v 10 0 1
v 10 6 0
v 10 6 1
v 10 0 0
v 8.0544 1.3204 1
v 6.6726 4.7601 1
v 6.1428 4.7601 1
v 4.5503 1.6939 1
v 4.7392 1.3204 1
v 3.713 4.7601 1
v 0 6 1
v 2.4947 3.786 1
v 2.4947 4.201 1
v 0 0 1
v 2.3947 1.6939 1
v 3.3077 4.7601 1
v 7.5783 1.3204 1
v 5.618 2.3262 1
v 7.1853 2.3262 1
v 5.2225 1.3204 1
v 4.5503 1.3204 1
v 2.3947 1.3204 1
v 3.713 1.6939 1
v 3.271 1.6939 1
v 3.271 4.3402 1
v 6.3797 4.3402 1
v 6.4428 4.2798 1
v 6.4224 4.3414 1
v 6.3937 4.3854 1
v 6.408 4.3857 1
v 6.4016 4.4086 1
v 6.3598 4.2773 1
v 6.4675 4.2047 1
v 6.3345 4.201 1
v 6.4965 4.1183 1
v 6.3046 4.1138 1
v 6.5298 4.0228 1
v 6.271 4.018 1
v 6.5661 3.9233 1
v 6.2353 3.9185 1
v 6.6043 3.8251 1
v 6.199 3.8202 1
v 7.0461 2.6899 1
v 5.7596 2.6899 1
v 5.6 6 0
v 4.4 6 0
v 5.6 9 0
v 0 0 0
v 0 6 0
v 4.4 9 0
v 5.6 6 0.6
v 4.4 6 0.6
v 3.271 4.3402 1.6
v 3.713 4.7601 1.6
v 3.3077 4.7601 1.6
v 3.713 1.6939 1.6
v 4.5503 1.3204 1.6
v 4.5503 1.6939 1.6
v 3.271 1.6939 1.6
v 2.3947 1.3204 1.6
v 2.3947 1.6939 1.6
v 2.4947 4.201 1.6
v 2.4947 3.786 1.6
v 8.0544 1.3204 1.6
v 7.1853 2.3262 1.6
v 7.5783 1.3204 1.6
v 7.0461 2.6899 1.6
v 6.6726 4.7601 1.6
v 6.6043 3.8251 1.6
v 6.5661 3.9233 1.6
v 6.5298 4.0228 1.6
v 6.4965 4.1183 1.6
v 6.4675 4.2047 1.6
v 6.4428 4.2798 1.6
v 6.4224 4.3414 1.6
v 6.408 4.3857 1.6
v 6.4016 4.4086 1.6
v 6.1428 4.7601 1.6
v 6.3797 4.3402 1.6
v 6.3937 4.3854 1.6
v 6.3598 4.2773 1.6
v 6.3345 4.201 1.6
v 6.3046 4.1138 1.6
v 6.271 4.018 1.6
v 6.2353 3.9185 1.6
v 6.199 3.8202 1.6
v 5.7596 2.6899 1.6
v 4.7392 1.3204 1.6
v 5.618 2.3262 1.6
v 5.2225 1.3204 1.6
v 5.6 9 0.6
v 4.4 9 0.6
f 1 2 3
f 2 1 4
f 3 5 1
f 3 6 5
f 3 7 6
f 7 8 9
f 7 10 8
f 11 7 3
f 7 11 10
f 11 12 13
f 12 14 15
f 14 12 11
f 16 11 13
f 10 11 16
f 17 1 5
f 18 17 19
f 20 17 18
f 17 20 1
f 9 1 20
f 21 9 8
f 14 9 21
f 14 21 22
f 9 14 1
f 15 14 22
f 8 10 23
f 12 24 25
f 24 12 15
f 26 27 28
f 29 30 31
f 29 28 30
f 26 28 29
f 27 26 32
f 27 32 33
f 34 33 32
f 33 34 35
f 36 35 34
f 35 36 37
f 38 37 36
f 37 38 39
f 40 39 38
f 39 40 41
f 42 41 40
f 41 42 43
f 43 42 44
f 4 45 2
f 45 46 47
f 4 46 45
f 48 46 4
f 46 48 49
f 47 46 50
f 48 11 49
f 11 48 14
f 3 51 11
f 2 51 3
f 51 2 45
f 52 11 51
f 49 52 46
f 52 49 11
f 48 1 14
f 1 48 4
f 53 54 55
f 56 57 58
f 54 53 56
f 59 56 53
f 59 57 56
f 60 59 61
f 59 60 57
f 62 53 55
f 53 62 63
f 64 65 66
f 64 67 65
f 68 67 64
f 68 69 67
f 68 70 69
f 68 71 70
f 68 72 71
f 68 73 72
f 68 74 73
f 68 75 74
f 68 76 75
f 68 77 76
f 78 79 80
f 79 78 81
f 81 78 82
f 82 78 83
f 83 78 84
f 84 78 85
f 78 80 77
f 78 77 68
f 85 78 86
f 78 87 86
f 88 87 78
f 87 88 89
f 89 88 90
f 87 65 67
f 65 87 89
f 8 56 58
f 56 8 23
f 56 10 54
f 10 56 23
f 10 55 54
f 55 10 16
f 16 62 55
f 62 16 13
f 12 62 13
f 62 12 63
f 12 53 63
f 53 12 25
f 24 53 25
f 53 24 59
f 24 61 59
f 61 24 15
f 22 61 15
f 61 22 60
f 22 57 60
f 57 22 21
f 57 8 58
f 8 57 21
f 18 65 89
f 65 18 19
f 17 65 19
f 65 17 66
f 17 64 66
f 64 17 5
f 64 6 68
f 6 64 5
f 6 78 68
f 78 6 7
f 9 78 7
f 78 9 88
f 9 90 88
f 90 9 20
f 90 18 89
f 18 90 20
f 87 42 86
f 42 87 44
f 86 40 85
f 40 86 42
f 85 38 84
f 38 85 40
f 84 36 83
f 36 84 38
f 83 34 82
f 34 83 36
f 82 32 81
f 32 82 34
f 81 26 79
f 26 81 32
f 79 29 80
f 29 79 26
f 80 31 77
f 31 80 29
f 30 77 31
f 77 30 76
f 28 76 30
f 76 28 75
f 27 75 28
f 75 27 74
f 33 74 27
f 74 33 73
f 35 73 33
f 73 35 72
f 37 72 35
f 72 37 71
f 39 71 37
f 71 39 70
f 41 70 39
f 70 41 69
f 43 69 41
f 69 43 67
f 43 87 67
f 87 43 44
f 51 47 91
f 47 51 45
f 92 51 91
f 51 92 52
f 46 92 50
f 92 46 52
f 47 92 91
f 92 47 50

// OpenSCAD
// Version-ID tab (Print lab Stage 1A.1): 10 x 6 x 1 mm with 0.6 mm raised text and a thin bridge (+Y) that joins the
// strip's end at bed level. Total height 1.6 mm = 8 layers at 0.2 mm.
label = "1A";
union() {
  cube([10, 6, 1]);
  translate([5, 3, 1]) linear_extrude(0.6) text(label, size = 3.6, halign = "center", valign = "center");
  translate([4.4, 6, 0]) cube([1.2, 3, 0.6]);
}
